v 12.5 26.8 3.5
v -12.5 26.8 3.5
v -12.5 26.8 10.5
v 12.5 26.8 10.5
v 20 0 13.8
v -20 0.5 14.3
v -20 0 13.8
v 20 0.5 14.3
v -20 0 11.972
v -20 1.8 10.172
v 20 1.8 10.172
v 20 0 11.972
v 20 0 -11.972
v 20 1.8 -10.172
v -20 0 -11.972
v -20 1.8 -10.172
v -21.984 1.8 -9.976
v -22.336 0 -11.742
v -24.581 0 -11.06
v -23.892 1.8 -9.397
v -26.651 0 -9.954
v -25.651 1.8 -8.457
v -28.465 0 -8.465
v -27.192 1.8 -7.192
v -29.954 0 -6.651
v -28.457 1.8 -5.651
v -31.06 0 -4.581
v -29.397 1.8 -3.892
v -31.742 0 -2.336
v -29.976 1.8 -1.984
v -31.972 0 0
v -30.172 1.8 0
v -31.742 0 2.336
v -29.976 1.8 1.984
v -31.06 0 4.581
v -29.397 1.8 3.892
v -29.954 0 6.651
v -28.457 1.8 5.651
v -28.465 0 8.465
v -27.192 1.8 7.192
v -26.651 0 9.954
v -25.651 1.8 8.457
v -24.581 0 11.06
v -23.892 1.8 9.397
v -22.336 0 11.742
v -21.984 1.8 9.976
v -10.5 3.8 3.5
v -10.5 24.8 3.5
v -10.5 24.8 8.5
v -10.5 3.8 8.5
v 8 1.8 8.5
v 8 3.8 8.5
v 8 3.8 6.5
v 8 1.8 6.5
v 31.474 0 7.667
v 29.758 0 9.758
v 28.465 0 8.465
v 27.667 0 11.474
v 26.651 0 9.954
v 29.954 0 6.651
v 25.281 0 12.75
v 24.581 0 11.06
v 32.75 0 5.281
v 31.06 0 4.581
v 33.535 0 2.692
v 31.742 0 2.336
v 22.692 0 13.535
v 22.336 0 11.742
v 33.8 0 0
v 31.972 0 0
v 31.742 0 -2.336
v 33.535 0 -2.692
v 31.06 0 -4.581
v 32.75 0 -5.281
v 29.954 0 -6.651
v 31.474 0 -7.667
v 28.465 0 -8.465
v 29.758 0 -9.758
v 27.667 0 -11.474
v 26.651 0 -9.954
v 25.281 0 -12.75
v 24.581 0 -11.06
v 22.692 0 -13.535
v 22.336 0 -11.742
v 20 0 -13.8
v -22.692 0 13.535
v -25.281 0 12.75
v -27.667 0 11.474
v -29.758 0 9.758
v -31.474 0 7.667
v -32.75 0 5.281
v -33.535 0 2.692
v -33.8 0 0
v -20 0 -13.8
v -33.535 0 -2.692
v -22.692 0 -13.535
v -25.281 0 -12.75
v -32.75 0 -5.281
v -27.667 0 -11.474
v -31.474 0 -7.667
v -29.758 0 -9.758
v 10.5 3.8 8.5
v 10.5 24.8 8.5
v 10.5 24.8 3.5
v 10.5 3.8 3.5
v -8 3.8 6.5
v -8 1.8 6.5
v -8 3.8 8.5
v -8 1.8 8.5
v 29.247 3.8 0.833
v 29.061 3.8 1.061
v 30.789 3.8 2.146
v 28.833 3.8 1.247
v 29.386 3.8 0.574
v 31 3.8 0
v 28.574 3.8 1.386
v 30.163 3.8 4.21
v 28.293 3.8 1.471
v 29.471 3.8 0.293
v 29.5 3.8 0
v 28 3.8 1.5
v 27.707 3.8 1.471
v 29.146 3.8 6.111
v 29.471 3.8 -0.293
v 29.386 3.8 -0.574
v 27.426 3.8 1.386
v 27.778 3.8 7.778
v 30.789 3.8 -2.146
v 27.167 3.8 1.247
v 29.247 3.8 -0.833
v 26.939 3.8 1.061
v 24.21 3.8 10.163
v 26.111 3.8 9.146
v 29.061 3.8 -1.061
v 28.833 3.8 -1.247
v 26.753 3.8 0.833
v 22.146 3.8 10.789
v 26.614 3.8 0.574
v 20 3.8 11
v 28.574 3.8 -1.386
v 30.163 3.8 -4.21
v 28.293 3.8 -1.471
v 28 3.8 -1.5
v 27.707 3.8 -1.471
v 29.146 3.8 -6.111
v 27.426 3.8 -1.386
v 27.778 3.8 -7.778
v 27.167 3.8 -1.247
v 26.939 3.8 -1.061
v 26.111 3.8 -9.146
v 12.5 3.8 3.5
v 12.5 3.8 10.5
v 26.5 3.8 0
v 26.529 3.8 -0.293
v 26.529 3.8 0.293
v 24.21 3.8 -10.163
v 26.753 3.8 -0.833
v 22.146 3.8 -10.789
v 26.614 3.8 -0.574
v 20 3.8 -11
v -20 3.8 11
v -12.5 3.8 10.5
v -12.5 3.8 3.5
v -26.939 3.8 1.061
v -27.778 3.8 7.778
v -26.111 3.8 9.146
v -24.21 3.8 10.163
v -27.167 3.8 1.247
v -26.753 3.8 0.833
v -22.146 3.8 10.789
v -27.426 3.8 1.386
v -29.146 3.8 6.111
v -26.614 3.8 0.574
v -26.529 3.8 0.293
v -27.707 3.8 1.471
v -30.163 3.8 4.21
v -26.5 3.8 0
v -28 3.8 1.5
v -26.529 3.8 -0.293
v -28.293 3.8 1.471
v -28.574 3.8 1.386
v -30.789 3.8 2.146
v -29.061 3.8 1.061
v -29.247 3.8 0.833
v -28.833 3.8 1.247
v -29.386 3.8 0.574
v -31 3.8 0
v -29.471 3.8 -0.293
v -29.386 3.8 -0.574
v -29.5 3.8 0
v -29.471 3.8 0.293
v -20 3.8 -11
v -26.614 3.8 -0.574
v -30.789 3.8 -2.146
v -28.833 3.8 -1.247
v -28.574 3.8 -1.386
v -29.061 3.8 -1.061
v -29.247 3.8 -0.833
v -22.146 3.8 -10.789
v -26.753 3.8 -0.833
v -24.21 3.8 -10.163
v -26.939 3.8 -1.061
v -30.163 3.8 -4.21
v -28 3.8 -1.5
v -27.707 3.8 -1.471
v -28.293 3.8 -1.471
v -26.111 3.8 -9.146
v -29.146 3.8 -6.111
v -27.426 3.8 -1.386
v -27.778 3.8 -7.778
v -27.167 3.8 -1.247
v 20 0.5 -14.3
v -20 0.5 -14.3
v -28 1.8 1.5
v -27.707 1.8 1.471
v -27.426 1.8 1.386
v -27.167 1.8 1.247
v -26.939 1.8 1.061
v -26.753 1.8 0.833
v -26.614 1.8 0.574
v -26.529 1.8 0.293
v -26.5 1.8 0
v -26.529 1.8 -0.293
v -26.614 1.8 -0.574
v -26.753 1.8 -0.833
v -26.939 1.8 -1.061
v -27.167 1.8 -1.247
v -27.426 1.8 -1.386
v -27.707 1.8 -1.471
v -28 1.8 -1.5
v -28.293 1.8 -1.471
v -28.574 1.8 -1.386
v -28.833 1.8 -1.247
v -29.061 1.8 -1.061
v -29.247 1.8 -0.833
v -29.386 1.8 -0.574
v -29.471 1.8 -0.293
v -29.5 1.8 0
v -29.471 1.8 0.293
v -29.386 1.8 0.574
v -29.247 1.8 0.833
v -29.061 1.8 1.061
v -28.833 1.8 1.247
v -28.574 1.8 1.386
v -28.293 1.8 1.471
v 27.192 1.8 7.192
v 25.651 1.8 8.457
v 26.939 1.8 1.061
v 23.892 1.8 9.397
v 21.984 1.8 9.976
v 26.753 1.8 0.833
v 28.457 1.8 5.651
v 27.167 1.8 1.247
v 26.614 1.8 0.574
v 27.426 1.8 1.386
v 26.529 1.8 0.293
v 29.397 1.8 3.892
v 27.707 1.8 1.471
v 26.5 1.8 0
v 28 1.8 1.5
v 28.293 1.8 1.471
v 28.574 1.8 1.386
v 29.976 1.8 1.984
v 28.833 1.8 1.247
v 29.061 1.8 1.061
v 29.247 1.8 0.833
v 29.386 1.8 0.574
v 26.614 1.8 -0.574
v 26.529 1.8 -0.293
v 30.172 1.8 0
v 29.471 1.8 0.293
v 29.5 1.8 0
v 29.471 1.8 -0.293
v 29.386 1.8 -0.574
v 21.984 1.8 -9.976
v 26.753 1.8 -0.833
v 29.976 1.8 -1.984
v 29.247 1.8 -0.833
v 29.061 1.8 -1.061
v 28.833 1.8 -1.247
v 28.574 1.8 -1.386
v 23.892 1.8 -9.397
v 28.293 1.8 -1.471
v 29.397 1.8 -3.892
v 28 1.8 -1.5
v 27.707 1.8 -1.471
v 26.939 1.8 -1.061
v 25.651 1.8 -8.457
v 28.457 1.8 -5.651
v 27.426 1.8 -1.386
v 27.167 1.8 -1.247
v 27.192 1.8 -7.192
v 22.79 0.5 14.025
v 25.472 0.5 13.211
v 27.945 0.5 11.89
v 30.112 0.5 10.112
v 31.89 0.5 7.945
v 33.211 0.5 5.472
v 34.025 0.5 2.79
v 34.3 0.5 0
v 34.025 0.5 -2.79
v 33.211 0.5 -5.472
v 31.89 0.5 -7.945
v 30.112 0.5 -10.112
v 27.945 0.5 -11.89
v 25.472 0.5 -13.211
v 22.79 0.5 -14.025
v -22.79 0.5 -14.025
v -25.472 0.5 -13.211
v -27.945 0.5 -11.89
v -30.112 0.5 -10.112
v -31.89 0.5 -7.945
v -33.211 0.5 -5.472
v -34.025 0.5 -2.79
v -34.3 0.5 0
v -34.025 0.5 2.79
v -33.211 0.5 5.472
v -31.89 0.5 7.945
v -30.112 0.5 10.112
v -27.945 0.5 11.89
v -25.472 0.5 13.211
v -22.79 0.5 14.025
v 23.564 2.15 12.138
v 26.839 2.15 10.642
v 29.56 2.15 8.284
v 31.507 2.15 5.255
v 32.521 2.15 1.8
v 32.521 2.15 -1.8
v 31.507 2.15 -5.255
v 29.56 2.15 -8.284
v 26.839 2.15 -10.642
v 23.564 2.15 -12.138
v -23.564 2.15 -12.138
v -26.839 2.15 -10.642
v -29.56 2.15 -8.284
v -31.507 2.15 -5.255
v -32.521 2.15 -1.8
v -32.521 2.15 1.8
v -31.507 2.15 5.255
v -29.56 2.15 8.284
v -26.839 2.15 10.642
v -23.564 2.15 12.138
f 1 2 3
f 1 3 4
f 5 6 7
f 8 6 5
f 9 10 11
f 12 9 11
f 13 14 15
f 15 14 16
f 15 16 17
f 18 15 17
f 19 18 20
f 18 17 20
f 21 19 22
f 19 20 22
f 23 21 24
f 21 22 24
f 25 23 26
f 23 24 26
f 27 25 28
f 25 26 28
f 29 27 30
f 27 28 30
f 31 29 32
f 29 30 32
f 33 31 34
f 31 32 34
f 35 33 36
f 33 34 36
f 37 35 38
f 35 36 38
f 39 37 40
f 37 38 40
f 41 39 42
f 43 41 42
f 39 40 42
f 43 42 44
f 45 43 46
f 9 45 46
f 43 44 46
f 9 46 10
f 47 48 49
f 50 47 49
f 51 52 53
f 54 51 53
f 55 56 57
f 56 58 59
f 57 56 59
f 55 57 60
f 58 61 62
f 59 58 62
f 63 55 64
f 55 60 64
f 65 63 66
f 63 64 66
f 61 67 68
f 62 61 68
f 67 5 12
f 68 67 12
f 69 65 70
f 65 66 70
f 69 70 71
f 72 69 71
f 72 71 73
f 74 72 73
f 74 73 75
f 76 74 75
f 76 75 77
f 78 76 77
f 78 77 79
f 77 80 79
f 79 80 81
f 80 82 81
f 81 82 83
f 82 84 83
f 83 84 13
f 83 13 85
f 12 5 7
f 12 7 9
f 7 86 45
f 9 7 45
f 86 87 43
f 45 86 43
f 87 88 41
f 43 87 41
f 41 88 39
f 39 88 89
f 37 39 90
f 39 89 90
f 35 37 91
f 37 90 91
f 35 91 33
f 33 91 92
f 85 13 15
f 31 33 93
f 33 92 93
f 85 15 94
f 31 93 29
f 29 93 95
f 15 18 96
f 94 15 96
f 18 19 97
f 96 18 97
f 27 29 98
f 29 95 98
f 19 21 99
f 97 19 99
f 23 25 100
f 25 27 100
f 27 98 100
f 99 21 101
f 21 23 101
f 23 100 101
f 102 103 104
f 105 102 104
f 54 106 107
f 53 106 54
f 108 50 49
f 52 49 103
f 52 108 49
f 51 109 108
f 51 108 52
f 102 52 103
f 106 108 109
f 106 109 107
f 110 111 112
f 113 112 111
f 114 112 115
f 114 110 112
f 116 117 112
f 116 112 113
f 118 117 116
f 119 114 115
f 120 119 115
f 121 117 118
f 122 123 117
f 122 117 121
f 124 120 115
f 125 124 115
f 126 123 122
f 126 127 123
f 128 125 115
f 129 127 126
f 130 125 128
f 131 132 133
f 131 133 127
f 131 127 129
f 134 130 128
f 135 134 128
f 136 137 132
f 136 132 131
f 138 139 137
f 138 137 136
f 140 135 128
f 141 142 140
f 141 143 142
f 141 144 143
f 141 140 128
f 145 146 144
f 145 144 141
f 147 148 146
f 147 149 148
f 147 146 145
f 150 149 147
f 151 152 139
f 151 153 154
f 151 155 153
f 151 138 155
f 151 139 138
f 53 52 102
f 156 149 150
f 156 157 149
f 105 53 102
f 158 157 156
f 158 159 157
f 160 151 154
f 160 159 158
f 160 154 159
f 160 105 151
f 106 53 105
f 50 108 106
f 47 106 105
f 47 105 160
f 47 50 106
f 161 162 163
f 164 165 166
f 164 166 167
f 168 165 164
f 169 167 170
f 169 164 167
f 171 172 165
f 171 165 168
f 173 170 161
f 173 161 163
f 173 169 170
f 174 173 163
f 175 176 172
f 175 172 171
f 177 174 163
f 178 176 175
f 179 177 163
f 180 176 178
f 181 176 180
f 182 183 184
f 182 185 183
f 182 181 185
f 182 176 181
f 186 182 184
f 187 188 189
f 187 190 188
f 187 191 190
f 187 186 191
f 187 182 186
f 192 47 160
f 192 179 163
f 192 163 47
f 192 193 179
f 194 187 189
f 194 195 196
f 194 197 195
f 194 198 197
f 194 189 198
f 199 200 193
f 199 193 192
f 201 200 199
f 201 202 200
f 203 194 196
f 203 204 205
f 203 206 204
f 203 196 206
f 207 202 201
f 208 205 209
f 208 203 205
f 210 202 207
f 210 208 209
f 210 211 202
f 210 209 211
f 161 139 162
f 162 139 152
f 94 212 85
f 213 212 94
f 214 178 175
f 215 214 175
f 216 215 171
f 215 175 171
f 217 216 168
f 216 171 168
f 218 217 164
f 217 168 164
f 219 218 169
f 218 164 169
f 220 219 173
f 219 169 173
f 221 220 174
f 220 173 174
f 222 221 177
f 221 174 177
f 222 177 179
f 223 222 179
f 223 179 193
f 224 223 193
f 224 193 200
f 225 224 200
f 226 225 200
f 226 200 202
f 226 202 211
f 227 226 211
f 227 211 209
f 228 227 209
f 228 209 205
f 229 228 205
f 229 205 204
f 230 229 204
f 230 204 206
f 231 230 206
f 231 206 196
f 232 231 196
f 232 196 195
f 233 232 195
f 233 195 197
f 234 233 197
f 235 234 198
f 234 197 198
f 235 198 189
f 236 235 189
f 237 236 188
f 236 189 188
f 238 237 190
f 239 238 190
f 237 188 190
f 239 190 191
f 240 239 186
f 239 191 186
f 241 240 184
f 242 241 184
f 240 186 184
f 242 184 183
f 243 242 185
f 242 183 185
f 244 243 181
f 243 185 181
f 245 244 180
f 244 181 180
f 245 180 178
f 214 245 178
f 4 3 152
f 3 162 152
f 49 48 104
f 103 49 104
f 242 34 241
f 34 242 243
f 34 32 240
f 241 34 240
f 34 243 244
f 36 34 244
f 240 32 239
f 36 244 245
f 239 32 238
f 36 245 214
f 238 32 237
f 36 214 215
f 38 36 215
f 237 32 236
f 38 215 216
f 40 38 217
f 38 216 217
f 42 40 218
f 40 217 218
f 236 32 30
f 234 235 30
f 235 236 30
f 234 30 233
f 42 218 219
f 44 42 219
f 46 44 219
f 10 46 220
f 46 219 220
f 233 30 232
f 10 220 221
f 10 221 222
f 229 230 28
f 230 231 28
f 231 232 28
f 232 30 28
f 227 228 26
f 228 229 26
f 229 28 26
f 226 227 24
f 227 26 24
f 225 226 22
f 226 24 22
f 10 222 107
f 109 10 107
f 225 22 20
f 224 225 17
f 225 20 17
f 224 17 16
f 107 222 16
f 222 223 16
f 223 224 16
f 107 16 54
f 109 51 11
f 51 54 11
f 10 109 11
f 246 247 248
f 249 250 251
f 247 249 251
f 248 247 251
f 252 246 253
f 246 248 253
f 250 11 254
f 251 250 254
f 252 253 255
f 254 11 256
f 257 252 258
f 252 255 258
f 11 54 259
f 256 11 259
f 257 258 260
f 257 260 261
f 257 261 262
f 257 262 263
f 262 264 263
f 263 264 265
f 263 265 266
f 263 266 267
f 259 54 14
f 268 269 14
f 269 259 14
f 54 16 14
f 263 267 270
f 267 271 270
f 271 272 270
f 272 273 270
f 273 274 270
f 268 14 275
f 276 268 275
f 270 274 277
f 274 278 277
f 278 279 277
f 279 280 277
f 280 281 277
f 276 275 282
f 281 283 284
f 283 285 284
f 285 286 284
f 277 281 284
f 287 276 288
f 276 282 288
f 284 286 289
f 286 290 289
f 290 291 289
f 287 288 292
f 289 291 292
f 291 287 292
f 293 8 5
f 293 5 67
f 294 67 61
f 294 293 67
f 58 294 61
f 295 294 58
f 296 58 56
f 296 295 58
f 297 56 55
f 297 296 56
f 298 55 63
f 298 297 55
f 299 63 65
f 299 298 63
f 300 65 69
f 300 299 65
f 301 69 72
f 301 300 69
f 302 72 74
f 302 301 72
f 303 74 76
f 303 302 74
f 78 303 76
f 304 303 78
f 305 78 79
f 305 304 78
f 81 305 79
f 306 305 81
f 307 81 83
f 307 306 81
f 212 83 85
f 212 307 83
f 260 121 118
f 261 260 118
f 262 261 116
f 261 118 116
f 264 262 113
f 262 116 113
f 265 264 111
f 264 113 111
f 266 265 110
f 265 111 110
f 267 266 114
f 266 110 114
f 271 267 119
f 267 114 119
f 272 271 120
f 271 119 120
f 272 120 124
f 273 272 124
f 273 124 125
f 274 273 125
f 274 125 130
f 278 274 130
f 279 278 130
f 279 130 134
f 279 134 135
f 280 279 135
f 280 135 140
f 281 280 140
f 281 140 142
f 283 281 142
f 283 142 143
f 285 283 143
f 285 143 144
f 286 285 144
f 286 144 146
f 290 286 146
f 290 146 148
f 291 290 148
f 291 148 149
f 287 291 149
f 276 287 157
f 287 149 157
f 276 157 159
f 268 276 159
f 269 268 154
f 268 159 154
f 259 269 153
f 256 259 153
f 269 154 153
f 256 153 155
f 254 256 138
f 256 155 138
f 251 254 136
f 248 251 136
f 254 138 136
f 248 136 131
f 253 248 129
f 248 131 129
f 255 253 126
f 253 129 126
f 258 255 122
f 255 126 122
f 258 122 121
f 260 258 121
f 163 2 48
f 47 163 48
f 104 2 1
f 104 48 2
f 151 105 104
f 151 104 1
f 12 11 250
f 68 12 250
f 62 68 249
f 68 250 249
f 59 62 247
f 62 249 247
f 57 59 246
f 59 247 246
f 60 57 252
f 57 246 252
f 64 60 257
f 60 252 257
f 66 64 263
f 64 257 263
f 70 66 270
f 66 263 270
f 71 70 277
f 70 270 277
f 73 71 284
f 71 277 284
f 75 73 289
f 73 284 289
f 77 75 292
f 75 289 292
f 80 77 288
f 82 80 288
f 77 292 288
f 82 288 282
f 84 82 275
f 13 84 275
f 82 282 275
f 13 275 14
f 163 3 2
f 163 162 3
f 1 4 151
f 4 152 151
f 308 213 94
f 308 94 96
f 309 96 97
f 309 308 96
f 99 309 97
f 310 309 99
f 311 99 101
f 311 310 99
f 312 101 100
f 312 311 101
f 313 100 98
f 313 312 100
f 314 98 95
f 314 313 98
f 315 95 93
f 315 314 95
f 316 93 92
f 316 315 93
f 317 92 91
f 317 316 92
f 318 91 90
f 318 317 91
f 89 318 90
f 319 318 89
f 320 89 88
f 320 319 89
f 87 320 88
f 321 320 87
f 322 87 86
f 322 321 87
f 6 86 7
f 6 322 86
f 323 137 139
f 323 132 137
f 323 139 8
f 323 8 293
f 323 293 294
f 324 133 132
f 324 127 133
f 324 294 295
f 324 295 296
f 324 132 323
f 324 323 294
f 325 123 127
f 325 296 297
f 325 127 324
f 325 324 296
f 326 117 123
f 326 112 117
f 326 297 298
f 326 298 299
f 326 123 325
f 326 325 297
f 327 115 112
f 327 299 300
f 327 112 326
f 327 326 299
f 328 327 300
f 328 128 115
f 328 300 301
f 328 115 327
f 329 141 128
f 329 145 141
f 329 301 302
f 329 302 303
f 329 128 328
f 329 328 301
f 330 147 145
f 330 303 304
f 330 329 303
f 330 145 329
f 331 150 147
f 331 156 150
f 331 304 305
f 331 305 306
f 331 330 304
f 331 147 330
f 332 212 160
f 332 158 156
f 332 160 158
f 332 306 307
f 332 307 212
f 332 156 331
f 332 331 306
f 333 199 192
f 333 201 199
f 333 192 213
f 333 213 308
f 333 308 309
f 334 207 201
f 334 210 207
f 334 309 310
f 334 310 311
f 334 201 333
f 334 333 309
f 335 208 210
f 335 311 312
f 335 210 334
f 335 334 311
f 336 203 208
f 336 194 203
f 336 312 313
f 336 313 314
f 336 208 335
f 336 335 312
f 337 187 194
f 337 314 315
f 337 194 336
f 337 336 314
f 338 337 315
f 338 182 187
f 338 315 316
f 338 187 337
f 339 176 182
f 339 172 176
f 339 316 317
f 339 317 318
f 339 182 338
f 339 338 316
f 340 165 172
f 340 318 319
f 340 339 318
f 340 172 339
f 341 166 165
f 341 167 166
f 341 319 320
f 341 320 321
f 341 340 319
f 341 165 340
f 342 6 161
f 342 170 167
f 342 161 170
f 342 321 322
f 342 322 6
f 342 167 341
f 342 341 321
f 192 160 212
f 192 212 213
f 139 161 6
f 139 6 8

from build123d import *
from OCP.BRepFilletAPI import BRepFilletAPI_MakeChamfer

# Parameters (mm, degrees)
BOSS_EXTRU_1_DEPTH      = 3.8
BOSS_EXTRU_1_TAPER      = 45
COQUE2_DEPTH            = 1.8
COQUE2_DRAFT            = 45
CHANFREIN1_SIZE         = 1
CHANFREIN1_SIZE2        = 0.707106781
ENL_V_MAT_EXTRU_1_REACH = 39.355
ESQUISSE2_R             = 1.5
BOSS_EXTRU_2_DEPTH      = 21
ESQUISSE5_W             = 25
ESQUISSE5_H             = 7
BOSS_EXTRU_3_DEPTH      = 2
ESQUISSE6_W             = 16
ESQUISSE6_H             = 2
ENL_V_MAT_EXTRU_2_DEPTH = 2


# Read off the part's stored shape, not the designer's step: Coque2
with BuildPart() as part:
    # Esquisse1 → Boss.-Extru.1 (new body)
    with BuildSketch(Plane(origin=(0, 0, 0), x_dir=(1, 0, 0), z_dir=(0, 1, 0))):
        with BuildLine():
            ThreePointArc((-20, 14.8), (-34.8, 0), (-20, -14.8))
            Line((-20, -14.8), (20, -14.8))
            ThreePointArc((20, -14.8), (34.8, 0), (20, 14.8))
            Line((20, 14.8), (-20, 14.8))
        make_face()
    extrude(amount=BOSS_EXTRU_1_DEPTH, taper=BOSS_EXTRU_1_TAPER)


with BuildPart() as coque2_tool:
    # Coque2 outline → Coque2 (with draft: the straight prism first)
    with BuildSketch(Plane(origin=(0, 1.8, 0), x_dir=(1, 0, 0), z_dir=(0, 1, 0))):
        with BuildLine():
            Line((-20, -10.171572875), (20, -10.171572875))
            ThreePointArc((20, -10.171572875), (30.171572875, 0), (20, 10.171572875))
            Line((20, 10.171572875), (-20, 10.171572875))
            ThreePointArc((-20, 10.171572875), (-30.171572875, 0), (-20, -10.171572875))
        make_face()
    extrude(amount=-COQUE2_DEPTH)
    # Coque2: the draft: its side faces are tilted about the plane it starts from
    coque2_sides = [coque2_tool.faces().sort_by_distance(p)[0] for p in [
        (0, 0.9, 10.171572875),
        (30.171572875, 0.9, 0),
        (0, 0.9, -10.171572875),
        (-30.171572875, 0.9, 0),
    ]]
    draft(coque2_sides, Plane(origin=(0, 1.8, 0), x_dir=(1, 0, 0), z_dir=(0, 1, 0)), COQUE2_DRAFT)


with BuildPart() as part_1:
    add(part.part)

    # Coque2: cut by coque2_tool
    add(coque2_tool.part, mode=Mode.SUBTRACT)

    # Chanfrein1: one chamfer whose edges measure the first distance from different faces: ONE call of the kernel's chamfer builder (chamfer() names one face for all edges)
    chanfrein1_edges_1 = [part_1.edges().sort_by_distance(p)[0] for p in [
        (0, 0, -14.8),
        (0, 0, 14.8),
        (-34.8, 0, 0),
    ]]
    chanfrein1_side_1 = [part_1.faces().sort_by_distance(p)[0] for p in [
        (0, 0, -14.043672029),
    ]]
    chanfrein1_edges_2 = [part_1.edges().sort_by_distance(p)[0] for p in [
        (34.8, 0, 0),
    ]]
    chanfrein1_side_2 = [part_1.faces().sort_by_distance(p)[0] for p in [
        (32.9, 1.9, 0),
    ]]
    chanfrein1 = BRepFilletAPI_MakeChamfer(part_1.part.solid().wrapped)
    for e in chanfrein1_edges_1:
        chanfrein1.Add(CHANFREIN1_SIZE, CHANFREIN1_SIZE2, e.wrapped, chanfrein1_side_1[0].wrapped)  # the first distance lies on this face
    for e in chanfrein1_edges_2:
        chanfrein1.Add(CHANFREIN1_SIZE, CHANFREIN1_SIZE2, e.wrapped, chanfrein1_side_2[0].wrapped)  # the first distance lies on this face
    add(Compound.cast(chanfrein1.Shape()), mode=Mode.REPLACE)

    # Esquisse2 → Enlèv. mat.-Extru.1 (cut, up to next)
    with BuildSketch(Plane(origin=(0, 3.8, 0), x_dir=(1, 0, 0), z_dir=(0, 1, 0)), mode=Mode.PRIVATE) as enl_v_mat_extru_1_sk1:
        with Locations(Location((-28, 0, 0), (0, 0, 270))):
            Circle(ESQUISSE2_R)
    enl_v_mat_extru_1_tool1 = extrude(enl_v_mat_extru_1_sk1.sketch, amount=-ENL_V_MAT_EXTRU_1_REACH, mode=Mode.PRIVATE) & part_1.part
    # Esquisse2 → Enlèv. mat.-Extru.1 (cut, up to next)
    with BuildSketch(Plane(origin=(0, 3.8, 0), x_dir=(1, 0, 0), z_dir=(0, 1, 0)), mode=Mode.PRIVATE) as enl_v_mat_extru_1_sk2:
        with Locations(Location((28, 0, 0), (0, 0, 270))):
            Circle(ESQUISSE2_R)
    enl_v_mat_extru_1_tool2 = extrude(enl_v_mat_extru_1_sk2.sketch, amount=-ENL_V_MAT_EXTRU_1_REACH, mode=Mode.PRIVATE) & part_1.part
    add(enl_v_mat_extru_1_tool1.solids().sort_by_distance((-28, 3.8, 0))[0], mode=Mode.SUBTRACT)
    add(enl_v_mat_extru_1_tool2.solids().sort_by_distance((28, 3.8, 0))[0], mode=Mode.SUBTRACT)

    # Esquisse3 → Boss.-Extru.2 (add)
    with BuildSketch(Plane(origin=(0, 3.8, 0), x_dir=(1, 0, 0), z_dir=(0, 1, 0))):
        Polygon((-10.5, -8.5), (10.5, -8.5), (10.5, -3.5), (12.5, -3.5), (12.5, -10.5), (-12.5, -10.5), (-12.5, -3.5), (-10.5, -3.5), align=None)
    extrude(amount=BOSS_EXTRU_2_DEPTH)

    # Esquisse5 → Boss.-Extru.3 (add)
    with BuildSketch(Plane(origin=(0, 24.8, 0), x_dir=(1, 0, 0), z_dir=(0, 1, 0))):
        with Locations((0, -7)):
            Rectangle(ESQUISSE5_W, ESQUISSE5_H)
    extrude(amount=BOSS_EXTRU_3_DEPTH)

    # Esquisse6 → Enlèv. mat.-Extru.2 (cut)
    with BuildSketch(Plane(origin=(0, 3.8, 0), x_dir=(1, 0, 0), z_dir=(0, 1, 0))):
        with Locations((0, -7.5)):
            Rectangle(ESQUISSE6_W, ESQUISSE6_H)
    extrude(amount=-ENL_V_MAT_EXTRU_2_DEPTH, mode=Mode.SUBTRACT)


solid = part_1.part
